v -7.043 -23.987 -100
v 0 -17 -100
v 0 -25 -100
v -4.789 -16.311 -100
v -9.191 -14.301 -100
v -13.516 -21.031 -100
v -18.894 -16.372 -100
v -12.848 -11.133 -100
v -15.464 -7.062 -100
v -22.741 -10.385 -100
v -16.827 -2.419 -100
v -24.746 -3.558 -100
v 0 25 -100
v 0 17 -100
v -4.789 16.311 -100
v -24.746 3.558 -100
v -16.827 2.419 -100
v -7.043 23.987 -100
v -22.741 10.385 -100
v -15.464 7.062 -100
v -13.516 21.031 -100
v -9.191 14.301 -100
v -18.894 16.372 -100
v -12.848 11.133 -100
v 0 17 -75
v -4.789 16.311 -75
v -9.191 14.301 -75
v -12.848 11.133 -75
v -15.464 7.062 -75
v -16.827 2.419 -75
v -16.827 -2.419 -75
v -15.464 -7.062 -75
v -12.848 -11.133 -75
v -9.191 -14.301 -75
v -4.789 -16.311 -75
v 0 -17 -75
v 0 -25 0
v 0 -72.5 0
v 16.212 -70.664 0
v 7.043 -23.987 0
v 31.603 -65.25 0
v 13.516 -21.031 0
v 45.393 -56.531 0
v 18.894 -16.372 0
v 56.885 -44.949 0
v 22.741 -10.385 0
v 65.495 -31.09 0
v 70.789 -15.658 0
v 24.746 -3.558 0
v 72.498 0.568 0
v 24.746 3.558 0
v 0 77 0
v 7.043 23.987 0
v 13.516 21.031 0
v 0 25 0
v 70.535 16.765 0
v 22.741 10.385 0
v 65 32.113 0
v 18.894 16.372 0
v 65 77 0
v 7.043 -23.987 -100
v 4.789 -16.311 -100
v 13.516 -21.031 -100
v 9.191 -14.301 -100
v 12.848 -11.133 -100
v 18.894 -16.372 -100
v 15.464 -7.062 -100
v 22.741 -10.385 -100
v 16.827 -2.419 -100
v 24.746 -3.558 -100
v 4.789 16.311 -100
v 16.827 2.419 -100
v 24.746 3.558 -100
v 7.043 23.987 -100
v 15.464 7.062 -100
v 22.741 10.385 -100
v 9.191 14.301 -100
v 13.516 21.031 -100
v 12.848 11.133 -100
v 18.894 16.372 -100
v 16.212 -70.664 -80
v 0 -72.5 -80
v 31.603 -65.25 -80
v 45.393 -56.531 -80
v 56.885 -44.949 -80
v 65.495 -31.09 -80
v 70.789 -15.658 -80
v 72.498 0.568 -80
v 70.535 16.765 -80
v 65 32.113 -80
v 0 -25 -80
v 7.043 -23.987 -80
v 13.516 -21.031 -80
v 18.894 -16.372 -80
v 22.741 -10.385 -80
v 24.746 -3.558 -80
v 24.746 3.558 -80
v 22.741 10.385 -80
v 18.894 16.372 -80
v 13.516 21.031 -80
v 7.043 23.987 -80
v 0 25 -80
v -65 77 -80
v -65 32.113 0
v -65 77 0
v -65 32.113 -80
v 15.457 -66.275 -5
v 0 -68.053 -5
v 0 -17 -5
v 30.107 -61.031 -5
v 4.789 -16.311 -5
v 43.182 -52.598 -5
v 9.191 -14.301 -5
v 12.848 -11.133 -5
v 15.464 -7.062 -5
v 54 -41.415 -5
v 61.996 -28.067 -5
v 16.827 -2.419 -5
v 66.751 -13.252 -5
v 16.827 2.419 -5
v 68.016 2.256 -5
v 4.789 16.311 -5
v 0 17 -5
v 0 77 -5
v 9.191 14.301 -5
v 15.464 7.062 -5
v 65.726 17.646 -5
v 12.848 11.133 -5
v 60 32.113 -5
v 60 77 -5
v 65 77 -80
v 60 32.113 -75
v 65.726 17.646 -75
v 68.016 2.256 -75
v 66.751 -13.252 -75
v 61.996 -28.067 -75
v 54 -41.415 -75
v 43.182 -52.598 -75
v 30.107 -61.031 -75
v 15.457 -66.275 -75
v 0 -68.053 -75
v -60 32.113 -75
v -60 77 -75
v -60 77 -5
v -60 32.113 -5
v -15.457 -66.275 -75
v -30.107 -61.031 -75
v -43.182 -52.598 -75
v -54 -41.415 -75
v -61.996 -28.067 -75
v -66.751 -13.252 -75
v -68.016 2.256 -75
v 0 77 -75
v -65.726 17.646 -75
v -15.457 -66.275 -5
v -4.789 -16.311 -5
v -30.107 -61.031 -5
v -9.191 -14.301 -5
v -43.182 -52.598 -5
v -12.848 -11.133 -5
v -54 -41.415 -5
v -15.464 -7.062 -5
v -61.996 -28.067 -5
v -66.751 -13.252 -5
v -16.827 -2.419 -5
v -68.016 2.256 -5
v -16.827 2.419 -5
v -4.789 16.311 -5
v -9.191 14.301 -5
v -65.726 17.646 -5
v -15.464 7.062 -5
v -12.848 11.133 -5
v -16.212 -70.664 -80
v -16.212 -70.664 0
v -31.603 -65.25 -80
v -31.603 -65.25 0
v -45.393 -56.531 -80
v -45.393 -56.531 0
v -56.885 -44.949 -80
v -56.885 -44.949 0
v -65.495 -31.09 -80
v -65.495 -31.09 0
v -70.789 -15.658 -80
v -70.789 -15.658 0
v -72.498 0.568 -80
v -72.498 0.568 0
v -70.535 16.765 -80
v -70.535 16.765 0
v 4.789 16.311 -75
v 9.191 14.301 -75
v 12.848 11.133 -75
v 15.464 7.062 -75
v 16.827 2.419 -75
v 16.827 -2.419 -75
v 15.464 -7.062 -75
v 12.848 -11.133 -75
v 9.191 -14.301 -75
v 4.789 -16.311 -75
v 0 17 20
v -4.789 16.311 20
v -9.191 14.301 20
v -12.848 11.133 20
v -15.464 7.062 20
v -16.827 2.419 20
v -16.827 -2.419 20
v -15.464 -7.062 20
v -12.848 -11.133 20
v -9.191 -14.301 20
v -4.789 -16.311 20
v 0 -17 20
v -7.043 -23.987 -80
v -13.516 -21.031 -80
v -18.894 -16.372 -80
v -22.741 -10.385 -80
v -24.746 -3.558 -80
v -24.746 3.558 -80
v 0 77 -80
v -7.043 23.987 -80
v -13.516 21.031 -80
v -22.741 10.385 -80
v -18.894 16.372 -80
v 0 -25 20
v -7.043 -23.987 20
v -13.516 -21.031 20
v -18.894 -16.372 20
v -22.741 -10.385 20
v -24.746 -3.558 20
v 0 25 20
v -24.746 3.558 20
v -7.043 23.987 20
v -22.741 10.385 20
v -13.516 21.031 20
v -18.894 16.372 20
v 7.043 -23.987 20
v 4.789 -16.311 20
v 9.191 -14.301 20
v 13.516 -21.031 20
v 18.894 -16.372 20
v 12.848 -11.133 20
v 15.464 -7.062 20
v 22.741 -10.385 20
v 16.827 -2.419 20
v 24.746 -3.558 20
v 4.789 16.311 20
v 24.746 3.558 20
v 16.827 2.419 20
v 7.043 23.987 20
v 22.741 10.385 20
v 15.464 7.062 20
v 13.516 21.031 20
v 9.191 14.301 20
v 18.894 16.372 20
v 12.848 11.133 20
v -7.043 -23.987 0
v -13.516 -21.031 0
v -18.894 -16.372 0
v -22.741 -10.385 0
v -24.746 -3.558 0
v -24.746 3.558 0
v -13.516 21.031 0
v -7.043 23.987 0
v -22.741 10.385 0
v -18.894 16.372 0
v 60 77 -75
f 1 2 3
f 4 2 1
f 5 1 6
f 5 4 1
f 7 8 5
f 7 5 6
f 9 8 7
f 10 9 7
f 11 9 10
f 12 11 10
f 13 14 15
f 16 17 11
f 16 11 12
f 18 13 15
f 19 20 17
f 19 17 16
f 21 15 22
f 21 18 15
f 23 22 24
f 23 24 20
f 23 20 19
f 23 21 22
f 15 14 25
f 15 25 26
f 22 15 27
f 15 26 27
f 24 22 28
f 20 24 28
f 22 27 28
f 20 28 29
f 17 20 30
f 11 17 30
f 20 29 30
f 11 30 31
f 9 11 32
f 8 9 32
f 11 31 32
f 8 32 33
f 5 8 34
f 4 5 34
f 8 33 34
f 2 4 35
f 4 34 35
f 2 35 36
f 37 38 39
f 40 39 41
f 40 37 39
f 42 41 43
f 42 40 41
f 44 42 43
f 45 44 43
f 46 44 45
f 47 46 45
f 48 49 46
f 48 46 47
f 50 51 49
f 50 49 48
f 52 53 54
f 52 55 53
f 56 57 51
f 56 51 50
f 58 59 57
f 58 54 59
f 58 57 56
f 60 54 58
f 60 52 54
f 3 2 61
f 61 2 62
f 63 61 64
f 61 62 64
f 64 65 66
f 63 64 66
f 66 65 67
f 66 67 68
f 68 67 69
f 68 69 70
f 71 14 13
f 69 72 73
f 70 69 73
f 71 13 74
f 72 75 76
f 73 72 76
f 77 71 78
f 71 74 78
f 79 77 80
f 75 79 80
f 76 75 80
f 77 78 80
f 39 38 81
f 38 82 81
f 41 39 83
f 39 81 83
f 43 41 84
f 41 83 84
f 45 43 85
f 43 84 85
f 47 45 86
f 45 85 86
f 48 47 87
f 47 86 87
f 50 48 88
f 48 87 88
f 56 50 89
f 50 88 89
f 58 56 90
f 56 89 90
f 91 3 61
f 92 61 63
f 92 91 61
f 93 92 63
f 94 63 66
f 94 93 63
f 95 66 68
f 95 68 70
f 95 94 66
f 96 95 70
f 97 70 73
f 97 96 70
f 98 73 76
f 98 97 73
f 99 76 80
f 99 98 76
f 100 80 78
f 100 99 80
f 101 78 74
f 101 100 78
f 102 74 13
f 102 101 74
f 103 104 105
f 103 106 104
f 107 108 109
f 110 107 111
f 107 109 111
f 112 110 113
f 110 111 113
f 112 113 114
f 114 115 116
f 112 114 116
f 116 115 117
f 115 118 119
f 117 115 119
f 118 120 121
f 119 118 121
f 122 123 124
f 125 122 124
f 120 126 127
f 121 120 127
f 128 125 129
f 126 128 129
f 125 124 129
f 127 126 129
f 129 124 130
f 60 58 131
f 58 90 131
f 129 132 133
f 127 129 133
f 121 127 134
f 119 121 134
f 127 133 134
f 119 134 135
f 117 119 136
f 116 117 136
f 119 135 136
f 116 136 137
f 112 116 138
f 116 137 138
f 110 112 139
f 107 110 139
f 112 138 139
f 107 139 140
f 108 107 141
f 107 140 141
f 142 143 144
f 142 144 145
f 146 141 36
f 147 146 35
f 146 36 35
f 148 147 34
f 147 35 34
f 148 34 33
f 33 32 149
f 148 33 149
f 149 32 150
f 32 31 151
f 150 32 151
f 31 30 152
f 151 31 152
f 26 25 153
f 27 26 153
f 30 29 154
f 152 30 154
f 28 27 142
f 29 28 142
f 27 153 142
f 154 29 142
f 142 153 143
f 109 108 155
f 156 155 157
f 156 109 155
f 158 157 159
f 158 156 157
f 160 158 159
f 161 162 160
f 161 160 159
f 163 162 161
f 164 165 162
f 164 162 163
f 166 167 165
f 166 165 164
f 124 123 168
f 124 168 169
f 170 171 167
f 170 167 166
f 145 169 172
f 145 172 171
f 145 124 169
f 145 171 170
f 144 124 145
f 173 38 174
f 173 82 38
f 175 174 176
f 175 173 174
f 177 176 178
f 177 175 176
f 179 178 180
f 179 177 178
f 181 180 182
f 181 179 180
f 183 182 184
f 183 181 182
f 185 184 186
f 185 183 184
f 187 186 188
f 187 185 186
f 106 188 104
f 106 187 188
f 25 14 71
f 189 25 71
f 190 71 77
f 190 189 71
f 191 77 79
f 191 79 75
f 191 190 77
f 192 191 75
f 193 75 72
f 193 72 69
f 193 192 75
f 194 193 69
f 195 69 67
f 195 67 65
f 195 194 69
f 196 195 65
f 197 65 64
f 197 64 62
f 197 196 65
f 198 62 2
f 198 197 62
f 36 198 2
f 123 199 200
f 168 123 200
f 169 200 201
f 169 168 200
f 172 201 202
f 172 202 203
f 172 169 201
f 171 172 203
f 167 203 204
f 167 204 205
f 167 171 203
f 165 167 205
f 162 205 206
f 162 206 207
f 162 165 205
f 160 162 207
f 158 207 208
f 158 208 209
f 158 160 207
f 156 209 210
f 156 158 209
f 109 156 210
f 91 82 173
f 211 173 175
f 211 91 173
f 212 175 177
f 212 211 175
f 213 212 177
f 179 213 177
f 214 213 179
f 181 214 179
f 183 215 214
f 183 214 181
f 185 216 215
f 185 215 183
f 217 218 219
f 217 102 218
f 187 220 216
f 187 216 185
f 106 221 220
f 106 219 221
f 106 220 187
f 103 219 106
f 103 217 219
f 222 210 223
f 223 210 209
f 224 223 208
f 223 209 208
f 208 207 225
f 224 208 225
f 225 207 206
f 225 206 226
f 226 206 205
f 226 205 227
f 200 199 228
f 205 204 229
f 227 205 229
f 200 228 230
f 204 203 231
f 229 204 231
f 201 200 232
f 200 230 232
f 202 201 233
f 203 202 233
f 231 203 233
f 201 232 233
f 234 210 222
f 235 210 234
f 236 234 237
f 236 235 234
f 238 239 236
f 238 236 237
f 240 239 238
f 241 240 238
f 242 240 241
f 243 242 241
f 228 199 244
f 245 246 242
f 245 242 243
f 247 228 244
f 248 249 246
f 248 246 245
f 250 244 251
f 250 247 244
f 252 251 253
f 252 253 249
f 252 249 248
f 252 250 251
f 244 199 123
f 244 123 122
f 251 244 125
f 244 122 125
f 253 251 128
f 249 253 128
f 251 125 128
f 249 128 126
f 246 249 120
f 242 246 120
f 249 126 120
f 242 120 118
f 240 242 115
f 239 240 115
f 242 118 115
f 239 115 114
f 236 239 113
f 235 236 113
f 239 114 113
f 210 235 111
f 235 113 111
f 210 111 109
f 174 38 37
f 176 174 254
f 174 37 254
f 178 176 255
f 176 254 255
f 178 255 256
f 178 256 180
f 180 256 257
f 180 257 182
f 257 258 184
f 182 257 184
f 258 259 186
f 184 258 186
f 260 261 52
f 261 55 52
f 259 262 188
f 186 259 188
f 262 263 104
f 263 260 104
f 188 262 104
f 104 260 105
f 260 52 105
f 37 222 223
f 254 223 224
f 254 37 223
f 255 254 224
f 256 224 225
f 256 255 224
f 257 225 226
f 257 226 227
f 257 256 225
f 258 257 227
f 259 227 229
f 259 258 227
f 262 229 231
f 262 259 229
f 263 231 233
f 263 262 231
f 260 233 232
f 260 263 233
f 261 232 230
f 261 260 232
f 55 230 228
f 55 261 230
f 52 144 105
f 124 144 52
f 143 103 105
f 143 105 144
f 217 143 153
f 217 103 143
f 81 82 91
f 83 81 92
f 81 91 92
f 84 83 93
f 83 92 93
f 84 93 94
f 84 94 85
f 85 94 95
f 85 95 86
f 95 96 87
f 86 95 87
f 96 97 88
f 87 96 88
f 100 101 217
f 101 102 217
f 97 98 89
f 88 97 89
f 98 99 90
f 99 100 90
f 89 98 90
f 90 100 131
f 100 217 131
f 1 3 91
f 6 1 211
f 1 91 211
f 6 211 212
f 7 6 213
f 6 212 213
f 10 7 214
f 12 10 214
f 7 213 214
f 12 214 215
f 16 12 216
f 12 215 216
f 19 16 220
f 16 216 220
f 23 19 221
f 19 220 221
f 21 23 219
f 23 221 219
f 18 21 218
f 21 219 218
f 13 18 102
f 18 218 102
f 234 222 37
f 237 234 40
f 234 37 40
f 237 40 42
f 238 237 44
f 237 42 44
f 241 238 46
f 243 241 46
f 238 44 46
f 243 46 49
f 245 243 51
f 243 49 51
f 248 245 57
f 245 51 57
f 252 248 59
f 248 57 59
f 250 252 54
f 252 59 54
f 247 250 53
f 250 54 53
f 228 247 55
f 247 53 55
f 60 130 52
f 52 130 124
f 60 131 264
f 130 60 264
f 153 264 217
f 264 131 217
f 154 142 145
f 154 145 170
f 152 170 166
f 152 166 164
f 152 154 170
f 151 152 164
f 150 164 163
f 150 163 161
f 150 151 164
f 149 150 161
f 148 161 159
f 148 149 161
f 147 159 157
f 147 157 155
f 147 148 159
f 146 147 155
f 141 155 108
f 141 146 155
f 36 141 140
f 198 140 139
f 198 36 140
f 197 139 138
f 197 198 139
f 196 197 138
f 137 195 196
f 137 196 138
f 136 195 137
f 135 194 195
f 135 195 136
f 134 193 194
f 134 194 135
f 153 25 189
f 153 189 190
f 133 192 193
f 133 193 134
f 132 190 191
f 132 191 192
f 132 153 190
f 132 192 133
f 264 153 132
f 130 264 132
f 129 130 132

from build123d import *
from build123d.topology import SkipClean

# Parameters (mm, degrees)
BOSS_EXTRUDE1_DEPTH      = 20
BOSS_EXTRUDE1_DEPTH_BACK = 5
BOSS_EXTRUDE2_START      = -5
BOSS_EXTRUDE2_DEPTH      = 5
BOSS_EXTRUDE3_DEPTH      = 70


with BuildPart() as part:
    # Sketch1 → Boss-Extrude1 (new, two sides: drawn at the far end of the back side and taken through both)
    with BuildSketch(Plane.XY.offset(-BOSS_EXTRUDE1_DEPTH_BACK)):
        with BuildLine():
            Line((0, 25), (0, 17))
            ThreePointArc((0, 17), (-17, 0), (0, -17))
            Line((0, -17), (0, -25))
            ThreePointArc((0, -25), (-25, 0), (0, 25))
        make_face()
    extrude(amount=BOSS_EXTRUDE1_DEPTH + BOSS_EXTRUDE1_DEPTH_BACK)

    # Sketch2 → Boss-Extrude2 (add)
    with BuildSketch(Plane.XY.offset(BOSS_EXTRUDE2_START)):
        with BuildLine():
            Line((0, -25), (0, -72.5))
            ThreePointArc((0, -72.5), (-61.581037686, -38.262590053), (-65, 32.113081447))
            Line((-65, 32.113081447), (-65, 77))
            Line((-65, 77), (0, 77))
            Line((0, 77), (0, 25))
            Line((0, 25), (0, 17))
            ThreePointArc((0, 17), (-17, 0), (0, -17))
            Line((0, -17), (0, -25))
        make_face()
    extrude(amount=BOSS_EXTRUDE2_DEPTH)


with BuildPart() as body_2:
    # Mirror8: mirrored copy
    add(part.part.mirror(Plane.XY.offset(-40)))


with BuildPart() as part_1:
    add(part.part)

    add(body_2.part)  # Boss-Extrude3 merges body 2
    # Sketch3 → Boss-Extrude3 (add)
    with BuildSketch(Plane.XY.offset(-75)):
        with BuildLine():
            Line((-65, 32.113081447), (-65, 77))
            Line((-65, 77), (-60, 77))
            Line((-60, 77), (-60, 32.113081447))
            ThreePointArc((-60, 32.113081447), (-58.380864924, -34.970339014), (0, -68.053287944))
            Line((0, -68.053287944), (0, -72.5))
            ThreePointArc((0, -72.5), (-61.581037686, -38.262590053), (-65, 32.113081447))
        make_face()
    extrude(amount=BOSS_EXTRUDE3_DEPTH)

    # Mirror9: part across plane


with BuildPart() as part_2:
    with SkipClean():  # the faces are left unmerged after this step: merging them gives an invalid solid
        add(part_1.part)
        add(part_1.part.mirror(Plane(origin=(0, 0, 0), x_dir=(0, 0, 1), z_dir=(1, 0, 0))))


solid = part_2.part
